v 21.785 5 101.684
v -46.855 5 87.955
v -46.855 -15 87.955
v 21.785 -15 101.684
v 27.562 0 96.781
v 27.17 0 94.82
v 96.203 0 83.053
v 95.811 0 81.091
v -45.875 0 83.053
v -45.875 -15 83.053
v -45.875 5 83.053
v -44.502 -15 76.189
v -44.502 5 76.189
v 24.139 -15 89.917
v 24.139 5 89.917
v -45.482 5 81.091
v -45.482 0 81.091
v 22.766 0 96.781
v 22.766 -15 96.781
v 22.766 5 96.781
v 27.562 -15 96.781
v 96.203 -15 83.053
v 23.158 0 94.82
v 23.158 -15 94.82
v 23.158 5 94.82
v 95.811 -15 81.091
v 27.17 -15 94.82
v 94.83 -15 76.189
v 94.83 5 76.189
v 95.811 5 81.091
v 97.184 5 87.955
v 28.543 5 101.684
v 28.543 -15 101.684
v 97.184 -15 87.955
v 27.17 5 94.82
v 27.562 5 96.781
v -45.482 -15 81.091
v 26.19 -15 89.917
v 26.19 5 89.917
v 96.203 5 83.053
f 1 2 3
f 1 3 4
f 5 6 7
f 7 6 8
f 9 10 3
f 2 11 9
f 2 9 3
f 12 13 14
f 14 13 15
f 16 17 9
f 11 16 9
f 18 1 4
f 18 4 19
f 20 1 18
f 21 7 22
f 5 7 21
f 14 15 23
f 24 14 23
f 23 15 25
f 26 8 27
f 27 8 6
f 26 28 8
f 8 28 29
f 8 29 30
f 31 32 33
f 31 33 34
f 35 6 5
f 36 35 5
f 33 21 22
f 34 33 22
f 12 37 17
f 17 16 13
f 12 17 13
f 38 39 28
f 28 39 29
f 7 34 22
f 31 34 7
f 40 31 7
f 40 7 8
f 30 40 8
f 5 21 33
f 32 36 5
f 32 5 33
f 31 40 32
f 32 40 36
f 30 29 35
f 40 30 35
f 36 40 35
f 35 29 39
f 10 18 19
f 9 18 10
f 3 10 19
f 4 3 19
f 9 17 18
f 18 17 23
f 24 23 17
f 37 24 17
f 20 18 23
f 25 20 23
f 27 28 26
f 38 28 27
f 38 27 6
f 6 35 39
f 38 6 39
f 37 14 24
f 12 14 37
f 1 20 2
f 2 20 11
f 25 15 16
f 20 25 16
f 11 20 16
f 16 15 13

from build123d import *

# Parameters (mm, degrees)
BOSS_EXTRUDE1_DEPTH   = 5
BOSS_EXTRUDE1_2_DEPTH = 5
BOSS_EXTRUDE2_DEPTH   = 20


with BuildPart() as part:
    # Sketch1 → Boss-Extrude1 (new body)
    with BuildSketch(Plane(origin=(0, 0, 0), x_dir=(1, 0, 0), z_dir=(0, 1, 0))):
        Polygon((27.17022743, -94.819563398), (27.5624597, -96.780724749), (96.203106998, -83.05259529), (95.810874728, -81.091433938), align=None)
    extrude(amount=BOSS_EXTRUDE1_DEPTH)



with BuildPart() as body_2:
    # Sketch1 → Boss-Extrude1 2 (new body)
    with BuildSketch(Plane(origin=(0, 0, 0), x_dir=(1, 0, 0), z_dir=(0, 1, 0))):
        Polygon((22.766076999, -96.780724749), (23.15830927, -94.819563398), (-45.482338029, -81.091433938), (-45.874570299, -83.05259529), align=None)
    extrude(amount=BOSS_EXTRUDE1_2_DEPTH)


with BuildPart() as part_1:
    add(part.part)

    add(body_2.part)  # Boss-Extrude2 merges body 2
    # Sketch2 → Boss-Extrude2 (add)
    with BuildSketch(Plane(origin=(0, 5, 0), x_dir=(1, 0, 0), z_dir=(0, 1, 0))):
        Polygon((-45.482338029, -81.091433938), (-44.501757353, -76.18853056), (24.138889945, -89.916660019), (23.15830927, -94.819563398), align=None)
        Polygon((21.785496324, -101.683628128), (22.766076999, -96.780724749), (-45.874570299, -83.05259529), (-46.855150975, -87.955498668), align=None)
        Polygon((27.17022743, -94.819563398), (26.189646754, -89.916660019), (94.830294052, -76.18853056), (95.810874728, -81.091433938), align=None)
        Polygon((97.183687674, -87.955498668), (96.203106998, -83.05259529), (27.5624597, -96.780724749), (28.543040376, -101.683628128), align=None)
    extrude(amount=-BOSS_EXTRUDE2_DEPTH)


solid = part_1.part
